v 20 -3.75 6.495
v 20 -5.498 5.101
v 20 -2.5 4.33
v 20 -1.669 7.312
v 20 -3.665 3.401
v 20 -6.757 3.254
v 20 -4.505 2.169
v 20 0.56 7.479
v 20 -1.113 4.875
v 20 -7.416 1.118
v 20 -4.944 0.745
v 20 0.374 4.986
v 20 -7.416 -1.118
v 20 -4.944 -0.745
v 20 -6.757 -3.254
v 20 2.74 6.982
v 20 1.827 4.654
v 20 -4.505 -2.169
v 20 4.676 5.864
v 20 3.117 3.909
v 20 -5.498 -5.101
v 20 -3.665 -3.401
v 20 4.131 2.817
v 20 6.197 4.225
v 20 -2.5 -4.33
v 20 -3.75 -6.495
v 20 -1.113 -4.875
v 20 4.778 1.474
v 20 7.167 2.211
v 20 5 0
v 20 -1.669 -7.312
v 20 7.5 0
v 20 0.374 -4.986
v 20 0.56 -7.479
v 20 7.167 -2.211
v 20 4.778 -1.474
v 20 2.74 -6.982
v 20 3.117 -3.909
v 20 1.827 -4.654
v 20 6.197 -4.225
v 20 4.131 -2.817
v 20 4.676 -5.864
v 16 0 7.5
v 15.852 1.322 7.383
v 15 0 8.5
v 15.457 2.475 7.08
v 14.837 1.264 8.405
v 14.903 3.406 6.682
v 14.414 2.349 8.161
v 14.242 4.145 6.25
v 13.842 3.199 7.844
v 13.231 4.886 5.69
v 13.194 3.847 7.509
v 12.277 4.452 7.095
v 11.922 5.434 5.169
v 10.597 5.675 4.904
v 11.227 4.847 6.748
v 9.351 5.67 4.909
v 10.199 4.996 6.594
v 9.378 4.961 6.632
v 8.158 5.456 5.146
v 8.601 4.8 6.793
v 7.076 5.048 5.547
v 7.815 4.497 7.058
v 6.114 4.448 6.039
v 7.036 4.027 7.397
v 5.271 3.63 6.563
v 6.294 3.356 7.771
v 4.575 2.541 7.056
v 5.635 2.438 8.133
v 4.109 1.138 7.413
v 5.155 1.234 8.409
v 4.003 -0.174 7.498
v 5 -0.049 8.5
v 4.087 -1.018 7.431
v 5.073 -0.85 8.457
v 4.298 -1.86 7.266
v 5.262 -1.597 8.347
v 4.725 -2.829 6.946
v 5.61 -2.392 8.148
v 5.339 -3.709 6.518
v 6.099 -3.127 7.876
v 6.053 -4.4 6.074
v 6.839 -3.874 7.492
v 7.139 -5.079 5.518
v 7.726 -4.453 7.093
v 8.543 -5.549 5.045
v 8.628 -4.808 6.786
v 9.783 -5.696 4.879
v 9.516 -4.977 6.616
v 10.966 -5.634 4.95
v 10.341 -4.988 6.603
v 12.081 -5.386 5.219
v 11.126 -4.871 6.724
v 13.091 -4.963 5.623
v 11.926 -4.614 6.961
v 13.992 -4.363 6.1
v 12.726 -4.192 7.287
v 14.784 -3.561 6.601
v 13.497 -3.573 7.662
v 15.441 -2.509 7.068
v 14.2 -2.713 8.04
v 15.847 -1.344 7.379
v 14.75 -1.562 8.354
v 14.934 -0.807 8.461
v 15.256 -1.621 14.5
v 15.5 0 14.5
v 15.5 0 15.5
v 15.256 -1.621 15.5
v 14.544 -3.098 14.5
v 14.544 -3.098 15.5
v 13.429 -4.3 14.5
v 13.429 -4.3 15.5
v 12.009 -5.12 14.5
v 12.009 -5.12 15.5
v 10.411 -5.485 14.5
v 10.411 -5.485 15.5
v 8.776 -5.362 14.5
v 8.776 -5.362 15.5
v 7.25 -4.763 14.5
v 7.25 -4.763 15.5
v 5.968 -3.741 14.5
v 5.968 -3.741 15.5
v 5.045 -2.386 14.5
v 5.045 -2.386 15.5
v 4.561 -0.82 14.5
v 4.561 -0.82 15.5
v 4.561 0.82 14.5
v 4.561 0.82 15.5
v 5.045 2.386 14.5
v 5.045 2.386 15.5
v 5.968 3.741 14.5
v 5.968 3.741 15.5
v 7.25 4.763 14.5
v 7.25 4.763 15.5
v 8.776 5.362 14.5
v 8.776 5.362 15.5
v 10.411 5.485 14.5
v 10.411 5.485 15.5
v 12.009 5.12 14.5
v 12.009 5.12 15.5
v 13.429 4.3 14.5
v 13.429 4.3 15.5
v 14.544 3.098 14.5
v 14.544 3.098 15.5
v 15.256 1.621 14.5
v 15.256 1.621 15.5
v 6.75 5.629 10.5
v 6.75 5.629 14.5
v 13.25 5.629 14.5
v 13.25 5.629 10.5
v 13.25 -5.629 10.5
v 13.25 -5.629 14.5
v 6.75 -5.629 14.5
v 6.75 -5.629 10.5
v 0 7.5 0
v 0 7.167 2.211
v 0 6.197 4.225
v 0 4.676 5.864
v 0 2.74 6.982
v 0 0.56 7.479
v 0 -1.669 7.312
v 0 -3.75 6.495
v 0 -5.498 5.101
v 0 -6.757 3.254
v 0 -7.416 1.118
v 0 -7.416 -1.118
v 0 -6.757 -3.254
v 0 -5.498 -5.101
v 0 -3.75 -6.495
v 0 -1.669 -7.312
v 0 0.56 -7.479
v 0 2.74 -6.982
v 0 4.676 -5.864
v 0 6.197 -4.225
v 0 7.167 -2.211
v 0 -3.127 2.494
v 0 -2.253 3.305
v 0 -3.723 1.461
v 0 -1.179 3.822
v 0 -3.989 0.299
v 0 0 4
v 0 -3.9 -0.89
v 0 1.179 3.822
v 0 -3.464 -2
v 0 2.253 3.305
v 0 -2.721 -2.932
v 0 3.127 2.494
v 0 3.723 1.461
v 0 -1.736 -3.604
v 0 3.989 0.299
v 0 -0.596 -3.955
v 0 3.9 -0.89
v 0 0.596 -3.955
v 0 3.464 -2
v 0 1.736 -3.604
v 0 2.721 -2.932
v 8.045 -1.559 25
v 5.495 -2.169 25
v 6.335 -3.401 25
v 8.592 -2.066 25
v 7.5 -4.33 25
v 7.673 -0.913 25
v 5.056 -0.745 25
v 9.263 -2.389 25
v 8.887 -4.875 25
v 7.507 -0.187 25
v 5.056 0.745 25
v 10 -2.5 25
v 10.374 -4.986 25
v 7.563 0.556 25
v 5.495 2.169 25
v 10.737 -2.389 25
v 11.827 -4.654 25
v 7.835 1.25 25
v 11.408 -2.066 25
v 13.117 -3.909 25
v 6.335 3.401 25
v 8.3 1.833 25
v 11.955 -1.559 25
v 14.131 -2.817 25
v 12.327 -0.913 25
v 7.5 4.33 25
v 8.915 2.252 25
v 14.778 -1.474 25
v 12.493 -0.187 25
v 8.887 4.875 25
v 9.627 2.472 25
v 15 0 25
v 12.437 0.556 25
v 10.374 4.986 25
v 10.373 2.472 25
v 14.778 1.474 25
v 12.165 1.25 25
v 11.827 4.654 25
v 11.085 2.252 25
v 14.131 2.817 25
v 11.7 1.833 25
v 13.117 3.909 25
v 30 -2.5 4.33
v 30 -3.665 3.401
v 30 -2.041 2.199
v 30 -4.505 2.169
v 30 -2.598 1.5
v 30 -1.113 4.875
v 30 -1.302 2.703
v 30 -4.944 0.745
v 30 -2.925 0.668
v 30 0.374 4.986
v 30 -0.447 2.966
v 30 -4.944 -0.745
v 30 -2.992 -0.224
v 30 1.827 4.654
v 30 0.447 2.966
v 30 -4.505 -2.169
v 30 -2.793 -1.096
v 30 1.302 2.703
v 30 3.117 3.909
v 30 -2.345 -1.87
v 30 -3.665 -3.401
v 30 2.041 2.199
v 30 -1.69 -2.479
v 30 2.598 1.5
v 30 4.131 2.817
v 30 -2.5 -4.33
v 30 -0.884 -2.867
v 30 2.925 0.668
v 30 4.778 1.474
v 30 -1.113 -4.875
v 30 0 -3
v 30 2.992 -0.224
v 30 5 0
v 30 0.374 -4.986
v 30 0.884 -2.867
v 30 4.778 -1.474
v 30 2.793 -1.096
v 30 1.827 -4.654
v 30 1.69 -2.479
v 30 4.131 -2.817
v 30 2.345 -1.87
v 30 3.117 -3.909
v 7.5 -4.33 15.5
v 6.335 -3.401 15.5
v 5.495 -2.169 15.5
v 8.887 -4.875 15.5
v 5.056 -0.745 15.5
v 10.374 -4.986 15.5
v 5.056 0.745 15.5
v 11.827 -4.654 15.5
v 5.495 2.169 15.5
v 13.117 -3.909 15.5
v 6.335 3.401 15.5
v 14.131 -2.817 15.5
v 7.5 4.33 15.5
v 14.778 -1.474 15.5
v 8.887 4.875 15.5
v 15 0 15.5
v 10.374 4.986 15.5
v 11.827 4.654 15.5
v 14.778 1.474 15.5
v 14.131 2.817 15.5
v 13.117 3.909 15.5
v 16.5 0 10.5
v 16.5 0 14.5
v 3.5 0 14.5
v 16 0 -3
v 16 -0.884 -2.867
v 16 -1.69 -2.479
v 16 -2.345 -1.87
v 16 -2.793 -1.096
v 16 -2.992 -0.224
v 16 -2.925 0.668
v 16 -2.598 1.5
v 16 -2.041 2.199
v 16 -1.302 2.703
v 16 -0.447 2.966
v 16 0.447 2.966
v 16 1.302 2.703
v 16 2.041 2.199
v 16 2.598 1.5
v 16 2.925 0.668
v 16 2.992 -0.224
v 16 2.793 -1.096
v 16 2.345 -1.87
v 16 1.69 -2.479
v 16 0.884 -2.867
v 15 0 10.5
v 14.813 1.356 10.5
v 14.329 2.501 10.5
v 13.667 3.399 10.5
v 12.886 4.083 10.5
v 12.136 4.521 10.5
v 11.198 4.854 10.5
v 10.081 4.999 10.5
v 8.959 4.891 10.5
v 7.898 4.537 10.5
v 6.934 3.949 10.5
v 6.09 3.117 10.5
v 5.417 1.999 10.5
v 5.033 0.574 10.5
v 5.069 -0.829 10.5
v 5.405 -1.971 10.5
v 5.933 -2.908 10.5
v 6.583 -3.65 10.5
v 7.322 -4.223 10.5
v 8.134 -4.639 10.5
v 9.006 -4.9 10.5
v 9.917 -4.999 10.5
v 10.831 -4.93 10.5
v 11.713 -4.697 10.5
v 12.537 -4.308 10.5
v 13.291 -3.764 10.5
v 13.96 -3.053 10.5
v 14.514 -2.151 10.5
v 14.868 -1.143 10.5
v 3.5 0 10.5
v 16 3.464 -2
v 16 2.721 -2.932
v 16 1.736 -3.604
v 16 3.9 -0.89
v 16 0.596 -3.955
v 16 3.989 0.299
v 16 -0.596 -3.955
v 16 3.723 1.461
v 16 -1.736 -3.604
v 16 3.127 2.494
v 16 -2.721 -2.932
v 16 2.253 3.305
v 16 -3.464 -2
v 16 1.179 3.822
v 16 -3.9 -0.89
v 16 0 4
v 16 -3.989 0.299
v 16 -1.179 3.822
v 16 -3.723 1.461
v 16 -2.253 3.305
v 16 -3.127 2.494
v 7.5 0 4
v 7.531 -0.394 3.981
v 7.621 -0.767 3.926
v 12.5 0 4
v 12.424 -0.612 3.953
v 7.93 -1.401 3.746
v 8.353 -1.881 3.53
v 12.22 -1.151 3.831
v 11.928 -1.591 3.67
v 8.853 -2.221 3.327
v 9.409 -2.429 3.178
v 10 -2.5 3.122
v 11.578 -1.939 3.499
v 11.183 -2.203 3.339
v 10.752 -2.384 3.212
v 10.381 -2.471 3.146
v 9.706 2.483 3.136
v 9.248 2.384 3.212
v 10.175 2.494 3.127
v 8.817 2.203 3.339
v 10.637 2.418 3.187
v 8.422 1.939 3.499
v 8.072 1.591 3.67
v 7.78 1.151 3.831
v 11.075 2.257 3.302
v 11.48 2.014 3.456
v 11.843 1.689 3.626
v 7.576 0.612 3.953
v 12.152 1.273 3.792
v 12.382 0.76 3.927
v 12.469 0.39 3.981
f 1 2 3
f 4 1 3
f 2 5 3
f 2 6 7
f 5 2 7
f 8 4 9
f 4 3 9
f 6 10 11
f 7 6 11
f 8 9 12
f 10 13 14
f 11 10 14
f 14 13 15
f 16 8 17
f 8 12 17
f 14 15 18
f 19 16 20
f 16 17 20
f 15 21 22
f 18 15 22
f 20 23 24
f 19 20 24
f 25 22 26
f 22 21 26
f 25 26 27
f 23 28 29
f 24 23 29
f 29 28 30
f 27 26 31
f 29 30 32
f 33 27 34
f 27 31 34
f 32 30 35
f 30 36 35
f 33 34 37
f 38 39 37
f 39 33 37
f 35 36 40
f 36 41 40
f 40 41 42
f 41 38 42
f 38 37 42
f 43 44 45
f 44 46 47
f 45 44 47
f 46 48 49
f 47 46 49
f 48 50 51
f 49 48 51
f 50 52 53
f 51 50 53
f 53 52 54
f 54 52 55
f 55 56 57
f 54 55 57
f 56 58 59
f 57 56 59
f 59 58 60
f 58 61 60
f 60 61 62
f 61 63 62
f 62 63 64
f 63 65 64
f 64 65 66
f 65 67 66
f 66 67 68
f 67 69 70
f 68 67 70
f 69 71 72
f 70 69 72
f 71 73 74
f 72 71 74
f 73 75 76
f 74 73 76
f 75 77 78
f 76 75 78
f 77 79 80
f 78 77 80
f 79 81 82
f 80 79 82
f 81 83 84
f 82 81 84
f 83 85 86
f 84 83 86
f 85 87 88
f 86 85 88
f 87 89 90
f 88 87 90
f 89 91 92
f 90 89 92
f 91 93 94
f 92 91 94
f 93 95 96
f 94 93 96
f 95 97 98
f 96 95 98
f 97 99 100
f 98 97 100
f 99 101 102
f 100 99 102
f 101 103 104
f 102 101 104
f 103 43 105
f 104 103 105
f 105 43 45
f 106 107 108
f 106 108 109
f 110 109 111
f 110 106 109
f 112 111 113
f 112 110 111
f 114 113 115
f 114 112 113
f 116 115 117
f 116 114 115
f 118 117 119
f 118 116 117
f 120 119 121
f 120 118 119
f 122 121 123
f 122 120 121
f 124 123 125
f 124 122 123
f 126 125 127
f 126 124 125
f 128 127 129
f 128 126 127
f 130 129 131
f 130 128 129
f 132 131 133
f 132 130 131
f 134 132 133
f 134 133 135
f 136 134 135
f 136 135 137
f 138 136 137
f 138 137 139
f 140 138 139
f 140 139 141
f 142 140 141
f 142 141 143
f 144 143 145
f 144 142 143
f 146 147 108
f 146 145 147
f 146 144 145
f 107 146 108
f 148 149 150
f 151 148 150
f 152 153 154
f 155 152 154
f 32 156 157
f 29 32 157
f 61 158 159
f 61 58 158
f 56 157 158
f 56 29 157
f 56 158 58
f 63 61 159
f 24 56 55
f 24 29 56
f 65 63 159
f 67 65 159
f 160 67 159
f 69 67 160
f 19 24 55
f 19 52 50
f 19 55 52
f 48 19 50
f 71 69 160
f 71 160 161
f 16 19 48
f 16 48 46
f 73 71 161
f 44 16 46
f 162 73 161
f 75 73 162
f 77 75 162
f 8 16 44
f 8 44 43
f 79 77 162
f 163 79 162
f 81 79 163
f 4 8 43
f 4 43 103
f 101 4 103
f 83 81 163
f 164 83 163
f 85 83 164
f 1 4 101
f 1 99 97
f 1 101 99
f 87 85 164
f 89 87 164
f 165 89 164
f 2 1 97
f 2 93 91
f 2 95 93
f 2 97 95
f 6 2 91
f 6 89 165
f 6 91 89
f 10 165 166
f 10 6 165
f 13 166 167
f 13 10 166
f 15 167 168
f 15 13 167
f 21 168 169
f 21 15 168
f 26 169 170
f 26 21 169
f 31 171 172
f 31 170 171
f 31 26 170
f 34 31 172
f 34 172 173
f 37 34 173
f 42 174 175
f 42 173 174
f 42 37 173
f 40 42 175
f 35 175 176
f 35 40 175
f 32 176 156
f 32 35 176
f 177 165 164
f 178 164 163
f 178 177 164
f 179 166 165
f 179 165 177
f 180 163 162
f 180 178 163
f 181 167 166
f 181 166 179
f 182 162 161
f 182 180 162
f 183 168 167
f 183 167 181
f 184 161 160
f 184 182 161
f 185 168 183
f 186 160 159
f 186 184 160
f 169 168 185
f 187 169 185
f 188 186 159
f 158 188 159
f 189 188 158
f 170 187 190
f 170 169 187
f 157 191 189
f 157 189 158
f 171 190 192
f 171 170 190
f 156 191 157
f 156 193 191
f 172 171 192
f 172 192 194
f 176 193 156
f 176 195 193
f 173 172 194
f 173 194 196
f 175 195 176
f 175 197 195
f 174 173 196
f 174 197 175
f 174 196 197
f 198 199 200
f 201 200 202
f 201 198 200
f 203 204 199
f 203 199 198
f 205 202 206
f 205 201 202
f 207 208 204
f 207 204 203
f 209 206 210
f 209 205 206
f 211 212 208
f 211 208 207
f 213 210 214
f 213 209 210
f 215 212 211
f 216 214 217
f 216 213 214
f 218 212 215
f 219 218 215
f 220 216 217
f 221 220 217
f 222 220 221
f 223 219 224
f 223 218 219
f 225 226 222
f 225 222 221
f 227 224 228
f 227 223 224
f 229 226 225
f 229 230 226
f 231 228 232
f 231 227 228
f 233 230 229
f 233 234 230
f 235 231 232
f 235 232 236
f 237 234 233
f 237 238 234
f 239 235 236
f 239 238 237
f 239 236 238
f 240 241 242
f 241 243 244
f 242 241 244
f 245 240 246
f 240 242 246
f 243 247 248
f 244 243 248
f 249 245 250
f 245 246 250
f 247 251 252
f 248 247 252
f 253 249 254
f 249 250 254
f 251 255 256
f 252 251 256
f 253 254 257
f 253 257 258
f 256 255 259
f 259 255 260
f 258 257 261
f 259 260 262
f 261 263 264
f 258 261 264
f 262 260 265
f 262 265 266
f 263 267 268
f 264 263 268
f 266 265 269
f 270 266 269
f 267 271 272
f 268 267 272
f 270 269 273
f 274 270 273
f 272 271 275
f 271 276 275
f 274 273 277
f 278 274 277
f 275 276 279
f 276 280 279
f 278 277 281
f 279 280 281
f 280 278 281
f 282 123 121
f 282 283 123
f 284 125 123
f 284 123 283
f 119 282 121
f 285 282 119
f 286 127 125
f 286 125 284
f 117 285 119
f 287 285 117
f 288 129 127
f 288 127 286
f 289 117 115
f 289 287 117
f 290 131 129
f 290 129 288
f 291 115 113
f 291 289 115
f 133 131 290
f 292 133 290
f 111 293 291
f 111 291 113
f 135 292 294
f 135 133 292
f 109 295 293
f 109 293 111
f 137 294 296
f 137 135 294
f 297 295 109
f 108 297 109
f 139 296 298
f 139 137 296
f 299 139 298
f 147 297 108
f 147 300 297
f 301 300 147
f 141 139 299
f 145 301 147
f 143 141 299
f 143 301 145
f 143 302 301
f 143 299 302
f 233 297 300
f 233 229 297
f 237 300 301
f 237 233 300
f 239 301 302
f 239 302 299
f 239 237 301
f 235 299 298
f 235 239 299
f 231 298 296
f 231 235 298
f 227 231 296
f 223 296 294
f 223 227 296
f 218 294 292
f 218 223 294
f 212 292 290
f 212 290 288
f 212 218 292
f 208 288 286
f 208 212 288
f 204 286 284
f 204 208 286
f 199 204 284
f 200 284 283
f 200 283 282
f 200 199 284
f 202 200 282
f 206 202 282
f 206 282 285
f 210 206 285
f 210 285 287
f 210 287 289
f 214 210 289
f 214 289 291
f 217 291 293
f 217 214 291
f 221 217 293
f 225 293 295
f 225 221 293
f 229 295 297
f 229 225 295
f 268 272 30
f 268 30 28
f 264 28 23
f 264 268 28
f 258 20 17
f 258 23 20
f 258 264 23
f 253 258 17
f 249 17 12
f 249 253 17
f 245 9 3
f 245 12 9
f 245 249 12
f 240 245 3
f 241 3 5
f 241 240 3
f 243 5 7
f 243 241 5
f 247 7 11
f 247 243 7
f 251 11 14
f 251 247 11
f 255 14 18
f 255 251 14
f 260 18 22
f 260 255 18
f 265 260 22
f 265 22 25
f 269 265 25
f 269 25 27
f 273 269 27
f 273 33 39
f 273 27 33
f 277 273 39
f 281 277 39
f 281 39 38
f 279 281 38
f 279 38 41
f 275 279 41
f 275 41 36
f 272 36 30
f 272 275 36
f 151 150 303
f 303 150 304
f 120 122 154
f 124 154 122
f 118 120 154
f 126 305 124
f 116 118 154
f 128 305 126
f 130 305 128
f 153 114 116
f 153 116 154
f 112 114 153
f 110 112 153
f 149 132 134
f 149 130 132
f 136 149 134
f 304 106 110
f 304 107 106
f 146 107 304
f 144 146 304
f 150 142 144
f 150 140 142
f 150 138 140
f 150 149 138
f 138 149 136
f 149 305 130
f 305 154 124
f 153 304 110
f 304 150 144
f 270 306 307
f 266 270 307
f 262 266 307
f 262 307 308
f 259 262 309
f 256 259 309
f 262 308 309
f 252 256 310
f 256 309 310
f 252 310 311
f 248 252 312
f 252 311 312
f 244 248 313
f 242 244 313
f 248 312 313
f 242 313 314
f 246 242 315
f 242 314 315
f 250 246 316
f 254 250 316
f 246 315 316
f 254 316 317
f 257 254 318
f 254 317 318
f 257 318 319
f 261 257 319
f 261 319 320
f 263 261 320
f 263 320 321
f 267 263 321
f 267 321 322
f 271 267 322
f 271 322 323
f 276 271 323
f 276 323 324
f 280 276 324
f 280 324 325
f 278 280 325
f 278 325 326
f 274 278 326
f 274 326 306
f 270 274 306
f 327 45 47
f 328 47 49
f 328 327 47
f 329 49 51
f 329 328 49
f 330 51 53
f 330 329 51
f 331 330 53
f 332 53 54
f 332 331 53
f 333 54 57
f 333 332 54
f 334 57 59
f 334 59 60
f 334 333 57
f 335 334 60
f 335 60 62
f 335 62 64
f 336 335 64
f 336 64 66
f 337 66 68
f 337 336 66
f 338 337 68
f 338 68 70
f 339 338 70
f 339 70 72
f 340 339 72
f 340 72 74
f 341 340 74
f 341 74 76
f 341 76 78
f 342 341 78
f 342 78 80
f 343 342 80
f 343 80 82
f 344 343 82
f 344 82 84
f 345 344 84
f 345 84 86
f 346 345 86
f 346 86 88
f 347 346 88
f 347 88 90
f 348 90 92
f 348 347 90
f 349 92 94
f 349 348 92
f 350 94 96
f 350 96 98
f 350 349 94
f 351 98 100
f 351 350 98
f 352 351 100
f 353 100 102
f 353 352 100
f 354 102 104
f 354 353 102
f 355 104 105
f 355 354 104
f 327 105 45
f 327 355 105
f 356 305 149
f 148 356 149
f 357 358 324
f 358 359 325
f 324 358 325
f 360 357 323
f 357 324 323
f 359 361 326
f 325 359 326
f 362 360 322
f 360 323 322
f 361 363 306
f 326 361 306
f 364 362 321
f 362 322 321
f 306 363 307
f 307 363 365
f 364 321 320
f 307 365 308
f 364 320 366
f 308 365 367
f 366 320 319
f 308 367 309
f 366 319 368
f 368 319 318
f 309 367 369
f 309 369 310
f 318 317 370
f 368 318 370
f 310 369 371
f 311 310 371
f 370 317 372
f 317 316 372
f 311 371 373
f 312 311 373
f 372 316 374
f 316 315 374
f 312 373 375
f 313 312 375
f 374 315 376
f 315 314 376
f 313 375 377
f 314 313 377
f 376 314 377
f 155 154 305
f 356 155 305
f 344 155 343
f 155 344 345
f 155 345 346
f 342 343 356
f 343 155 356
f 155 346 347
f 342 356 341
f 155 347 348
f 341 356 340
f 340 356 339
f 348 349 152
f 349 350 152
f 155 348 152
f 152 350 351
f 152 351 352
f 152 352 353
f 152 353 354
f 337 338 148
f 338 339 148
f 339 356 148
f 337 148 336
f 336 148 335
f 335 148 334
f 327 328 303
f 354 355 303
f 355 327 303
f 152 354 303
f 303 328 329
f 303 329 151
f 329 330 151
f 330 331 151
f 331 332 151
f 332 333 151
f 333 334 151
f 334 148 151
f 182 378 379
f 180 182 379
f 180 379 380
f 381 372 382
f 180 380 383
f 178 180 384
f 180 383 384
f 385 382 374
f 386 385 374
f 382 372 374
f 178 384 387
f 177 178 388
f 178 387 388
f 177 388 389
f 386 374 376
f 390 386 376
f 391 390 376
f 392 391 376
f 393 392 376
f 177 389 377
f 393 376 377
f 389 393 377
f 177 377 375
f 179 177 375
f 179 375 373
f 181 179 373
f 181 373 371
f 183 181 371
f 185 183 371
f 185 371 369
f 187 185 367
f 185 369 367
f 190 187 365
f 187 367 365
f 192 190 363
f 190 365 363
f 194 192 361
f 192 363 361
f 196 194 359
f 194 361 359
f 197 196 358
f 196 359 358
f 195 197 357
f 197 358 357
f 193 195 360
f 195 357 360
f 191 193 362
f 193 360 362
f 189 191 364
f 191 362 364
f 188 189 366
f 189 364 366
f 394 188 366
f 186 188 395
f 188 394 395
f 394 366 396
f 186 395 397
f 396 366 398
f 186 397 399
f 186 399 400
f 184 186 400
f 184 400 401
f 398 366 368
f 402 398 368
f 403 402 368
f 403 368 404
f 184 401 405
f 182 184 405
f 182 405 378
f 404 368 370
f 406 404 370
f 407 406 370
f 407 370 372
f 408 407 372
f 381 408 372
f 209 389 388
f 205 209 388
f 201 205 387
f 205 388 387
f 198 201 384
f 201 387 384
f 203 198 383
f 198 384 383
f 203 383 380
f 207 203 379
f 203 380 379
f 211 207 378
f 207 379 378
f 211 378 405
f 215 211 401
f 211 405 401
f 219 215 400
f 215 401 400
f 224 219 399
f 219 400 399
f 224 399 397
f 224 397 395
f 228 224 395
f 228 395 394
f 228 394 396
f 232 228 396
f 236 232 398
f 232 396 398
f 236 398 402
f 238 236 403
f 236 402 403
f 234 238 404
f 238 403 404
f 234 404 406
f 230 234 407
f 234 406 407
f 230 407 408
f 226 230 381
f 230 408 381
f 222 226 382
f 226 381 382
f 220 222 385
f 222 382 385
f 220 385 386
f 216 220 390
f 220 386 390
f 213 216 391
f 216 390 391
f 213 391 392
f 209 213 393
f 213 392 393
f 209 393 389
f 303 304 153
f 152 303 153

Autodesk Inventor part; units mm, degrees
ref_plane "YZ Plane" through (0, 0, 0) normal (1, 0, 0) x (0, 1, 0)
sketch "Sketch1" plane through (0, 0, 0) normal (0, 0, 1) x (1, 0, 0)
  line L0 (0, 0) -> (0, 7.5)
  line L1 (0, 7.5) -> (20, 7.5)
  line L2 (20, 7.5) -> (20, 5)
  line L3 (20, 5) -> (30, 5)
  line L4 (30, 5) -> (30, 0)
  line L5 (30, 0) -> (0, 0)
  dimension "d0" = 30
  dimension "d1" = 10
  dimension "d2" = 15
  dimension "d3" = 10
revolve "Revolution1" add sketch "Sketch1" angle 360 about axis through (30, 0, 0) along (-1, 0, 0)
ref_plane "Work Plane1" through (0, 0, 25) normal (0, 0, 1) x (1, 0, 0)
sketch "Sketch2" plane through (0, 0, 25) normal (0, 0, 1) x (1, 0, 0)
  circle A0 centre (10, 0) radius 5
  point P0 (0, 0)
  dimension "d6" = 10
  dimension "d7" = 10
extrude "Extrusion1" add sketch "Sketch2" against normal up to surface
ref_plane "Work Plane2" through (0, 0, 12.5) normal (0, 0, 1) x (1, 0, 0)
sketch "Sketch3" plane through (0, 0, 12.5) normal (0, 0, 1) x (1, 0, 0)
  spline S0 degree 5 poles (15, 0) (15, 0.4219) (14.9555, 0.8387) (14.8687, 1.2398) (14.7463, 1.6158) (14.3477, 2.5523) (14.0183, 3.0596) (13.6471, 3.4841) (13.2419, 3.8427) (12.55, 4.312) (12.2828, 4.4645) (12.0061, 4.5954) (11.7208, 4.7045) (11.1518, 4.8741) (10.869, 4.9367) (10.5813, 4.9788) (10.2907, 5) (9.7153, 5) (9.4311, 4.9798) (9.1493, 4.9393) (8.8717, 4.8792) (8.3043, 4.7138) (8.0156, 4.6048) (7.7353, 4.4738) (7.4645, 4.3208) (6.884, 3.9294) (6.5801, 3.6794) (6.2931, 3.3932) (6.0271, 3.0673) (5.633, 2.4524) (5.4882, 2.1871) (5.3591, 1.9015) (5.2496, 1.5959) (5.0609, 0.8779) (4.9924, 0.4546) (4.9713, 0.0174) (4.9997, -0.4169) (5.1096, -1.0686) (5.1632, -1.2988) (5.2289, -1.5209) (5.305, -1.7336) (5.509, -2.2194) (5.6454, -2.4831) (5.7955, -2.7277) (5.957, -2.9541) (6.3184, -3.3966) (6.521, -3.6087) (6.7335, -3.8013) (6.9549, -3.9755) (7.4457, -4.3099) (7.7178, -4.4651) (7.9996, -4.5981) (8.29, -4.7088) (8.8615, -4.877) (9.1415, -4.9382) (9.4259, -4.9794) (9.7127, -5) (10.2898, -5) (10.5796, -4.979) (10.8666, -4.9371) (11.1485, -4.8748) (11.7152, -4.7064) (11.9989, -4.5984) (12.2741, -4.4688) (12.5399, -4.3179) (13.116, -3.9294) (13.4199, -3.6794) (13.7069, -3.3932) (13.973, -3.0673) (14.367, -2.4524) (14.5118, -2.1871) (14.6409, -1.9015) (14.7504, -1.5959) (14.8987, -1.0314) (14.9486, -0.7812) (14.9828, -0.5236) (15, -0.2621) (15, 0) knots 0 0 0 0 0 0 0.052953 0.052953 0.052953 0.052953 0.144858 0.144858 0.144858 0.144858 0.19905 0.19905 0.19905 0.19905 0.250146 0.250146 0.250146 0.250146 0.300195 0.300195 0.300195 0.300195 0.355044 0.355044 0.355044 0.355044 0.42274 0.42274 0.42274 0.42274 0.467615 0.467615 0.467615 0.467615 0.521968 0.521968 0.521968 0.521968 0.553072 0.553072 0.553072 0.553072 0.596617 0.596617 0.596617 0.596617 0.645101 0.645101 0.645101 0.645101 0.700146 0.700146 0.700146 0.700146 0.75049 0.75049 0.75049 0.75049 0.801269 0.801269 0.801269 0.801269 0.854949 0.854949 0.854949 0.854949 0.922334 0.922334 0.922334 0.922334 0.967006 0.967006 0.967006 0.967006 1 1 1 1 1 1 projected
  line L0 (0, 7.5) -> (0, -7.5) projected
  line L1 (20, 7.5) -> (20, -7.5) projected
  line L2 (3.5, 0) -> (6.75, 5.6292)
  line L3 (6.75, 5.6292) -> (13.25, 5.6292)
  line L4 (13.25, 5.6292) -> (16.5, 0)
  line L5 (16.5, 0) -> (13.25, -5.6292)
  line L6 (13.25, -5.6292) -> (6.75, -5.6292)
  line L7 (6.75, -5.6292) -> (3.5, 0)
  point P0 (0, 0)
  point P1 (10, 0)
  dimension "d11" = 13
  dimension "d12" = 10
extrude "Extrusion2" add sketch "Sketch3" along normal mid plane 4
chamfer "Chamfer1" distance 1 angle 45 1 edges at (5.0001, 0.0275, 7.4999)
sketch "Sketch4" plane through (10, 0, 25) normal (0, 0, 1) x (1, 0, 0)
  circle A0 centre (0, 0) radius 5 projected
  point P0 (-10, 0)
hole "Hole1" at (10, 0, 25) direction (0, 0, -1) diameter 5 depth 25
sketch "Sketch5" plane through (0, 0, 0) normal (-1, 0, 0) x (0, 0, 1)
  circle A0 centre (0, 0) radius 7.5 projected
hole "Hole2" at (0, 0, 0) direction (1, 0, 0) diameter 8 depth 16
sketch "Sketch6" plane through (30, 0, 0) normal (1, 0, 0) x (0, 0, -1)
  circle A0 centre (0, 0) radius 5 projected
hole "Hole3" at (30, 0, 0) direction (-1, 0, 0) diameter 6 depth 14
thread "Thread2" size "M8x1.25" class "6H" standard "ISO Metric profile" length 9
sketch "Sketch7" plane through (0, 0, 14.5) normal (0, 0, 1) x (1, 0, 0)
  circle A0 centre (10, 0) radius 2.5 projected
  line L0 (6.75, -5.6292) -> (3.5, 0) projected
  line L1 (3.5, 0) -> (6.75, 5.6292) projected
  line L2 (6.75, 5.6292) -> (13.25, 5.6292) projected
  line L3 (13.25, 5.6292) -> (16.5, 0) projected
  line L4 (16.5, 0) -> (13.25, -5.6292) projected
  line L5 (13.25, -5.6292) -> (6.75, -5.6292) projected
  circle A1 centre (10, 0) radius 5 projected
  circle A2 centre (10, 0) radius 5.5
  point P0 (0, 0)
  dimension "d43" = 11
extrude "Extrusion3" add sketch "Sketch7" along normal blind 1 contours A2
thread "Thread3" size "M10x1.5" class "6g" standard "ISO Metric profile" length 9.5
thread "Thread4" size "M10x1.5" class "6g" standard "ISO Metric profile" length 9.5
properties part number "123"
